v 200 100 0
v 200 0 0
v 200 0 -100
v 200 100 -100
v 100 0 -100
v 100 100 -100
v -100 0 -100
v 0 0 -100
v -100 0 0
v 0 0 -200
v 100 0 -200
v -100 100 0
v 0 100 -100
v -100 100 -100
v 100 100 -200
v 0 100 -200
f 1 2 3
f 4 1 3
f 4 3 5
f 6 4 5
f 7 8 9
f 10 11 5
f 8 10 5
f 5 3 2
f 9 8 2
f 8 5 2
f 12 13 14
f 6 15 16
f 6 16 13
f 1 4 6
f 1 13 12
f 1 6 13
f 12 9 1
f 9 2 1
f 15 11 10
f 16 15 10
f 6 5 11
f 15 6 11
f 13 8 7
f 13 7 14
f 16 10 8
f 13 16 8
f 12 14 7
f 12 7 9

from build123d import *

# Parameters (mm, degrees)
EXTRUDE_1_DEPTH = 100
SKETCH_3_W      = 100
SKETCH_3_H      = 100
EXTRUDE_3_DEPTH = 100


with BuildPart() as part:
    # 草图1 → 凸台-拉伸1 (new body)
    with BuildSketch(Plane(origin=(0, 0, 0), x_dir=(1, 0, 0), z_dir=(0, 1, 0))):
        Polygon((0, 0), (200, 0), (200, 100), (100, 100), (100, 200), (0, 200), align=None)
    extrude(amount=EXTRUDE_1_DEPTH)

    # 草图3 → 凸台-拉伸3 (add)
    with BuildSketch(Plane.ZY):
        with Locations((-50, 50)):
            Rectangle(SKETCH_3_W, SKETCH_3_H)
    extrude(amount=EXTRUDE_3_DEPTH)


solid = part.part
